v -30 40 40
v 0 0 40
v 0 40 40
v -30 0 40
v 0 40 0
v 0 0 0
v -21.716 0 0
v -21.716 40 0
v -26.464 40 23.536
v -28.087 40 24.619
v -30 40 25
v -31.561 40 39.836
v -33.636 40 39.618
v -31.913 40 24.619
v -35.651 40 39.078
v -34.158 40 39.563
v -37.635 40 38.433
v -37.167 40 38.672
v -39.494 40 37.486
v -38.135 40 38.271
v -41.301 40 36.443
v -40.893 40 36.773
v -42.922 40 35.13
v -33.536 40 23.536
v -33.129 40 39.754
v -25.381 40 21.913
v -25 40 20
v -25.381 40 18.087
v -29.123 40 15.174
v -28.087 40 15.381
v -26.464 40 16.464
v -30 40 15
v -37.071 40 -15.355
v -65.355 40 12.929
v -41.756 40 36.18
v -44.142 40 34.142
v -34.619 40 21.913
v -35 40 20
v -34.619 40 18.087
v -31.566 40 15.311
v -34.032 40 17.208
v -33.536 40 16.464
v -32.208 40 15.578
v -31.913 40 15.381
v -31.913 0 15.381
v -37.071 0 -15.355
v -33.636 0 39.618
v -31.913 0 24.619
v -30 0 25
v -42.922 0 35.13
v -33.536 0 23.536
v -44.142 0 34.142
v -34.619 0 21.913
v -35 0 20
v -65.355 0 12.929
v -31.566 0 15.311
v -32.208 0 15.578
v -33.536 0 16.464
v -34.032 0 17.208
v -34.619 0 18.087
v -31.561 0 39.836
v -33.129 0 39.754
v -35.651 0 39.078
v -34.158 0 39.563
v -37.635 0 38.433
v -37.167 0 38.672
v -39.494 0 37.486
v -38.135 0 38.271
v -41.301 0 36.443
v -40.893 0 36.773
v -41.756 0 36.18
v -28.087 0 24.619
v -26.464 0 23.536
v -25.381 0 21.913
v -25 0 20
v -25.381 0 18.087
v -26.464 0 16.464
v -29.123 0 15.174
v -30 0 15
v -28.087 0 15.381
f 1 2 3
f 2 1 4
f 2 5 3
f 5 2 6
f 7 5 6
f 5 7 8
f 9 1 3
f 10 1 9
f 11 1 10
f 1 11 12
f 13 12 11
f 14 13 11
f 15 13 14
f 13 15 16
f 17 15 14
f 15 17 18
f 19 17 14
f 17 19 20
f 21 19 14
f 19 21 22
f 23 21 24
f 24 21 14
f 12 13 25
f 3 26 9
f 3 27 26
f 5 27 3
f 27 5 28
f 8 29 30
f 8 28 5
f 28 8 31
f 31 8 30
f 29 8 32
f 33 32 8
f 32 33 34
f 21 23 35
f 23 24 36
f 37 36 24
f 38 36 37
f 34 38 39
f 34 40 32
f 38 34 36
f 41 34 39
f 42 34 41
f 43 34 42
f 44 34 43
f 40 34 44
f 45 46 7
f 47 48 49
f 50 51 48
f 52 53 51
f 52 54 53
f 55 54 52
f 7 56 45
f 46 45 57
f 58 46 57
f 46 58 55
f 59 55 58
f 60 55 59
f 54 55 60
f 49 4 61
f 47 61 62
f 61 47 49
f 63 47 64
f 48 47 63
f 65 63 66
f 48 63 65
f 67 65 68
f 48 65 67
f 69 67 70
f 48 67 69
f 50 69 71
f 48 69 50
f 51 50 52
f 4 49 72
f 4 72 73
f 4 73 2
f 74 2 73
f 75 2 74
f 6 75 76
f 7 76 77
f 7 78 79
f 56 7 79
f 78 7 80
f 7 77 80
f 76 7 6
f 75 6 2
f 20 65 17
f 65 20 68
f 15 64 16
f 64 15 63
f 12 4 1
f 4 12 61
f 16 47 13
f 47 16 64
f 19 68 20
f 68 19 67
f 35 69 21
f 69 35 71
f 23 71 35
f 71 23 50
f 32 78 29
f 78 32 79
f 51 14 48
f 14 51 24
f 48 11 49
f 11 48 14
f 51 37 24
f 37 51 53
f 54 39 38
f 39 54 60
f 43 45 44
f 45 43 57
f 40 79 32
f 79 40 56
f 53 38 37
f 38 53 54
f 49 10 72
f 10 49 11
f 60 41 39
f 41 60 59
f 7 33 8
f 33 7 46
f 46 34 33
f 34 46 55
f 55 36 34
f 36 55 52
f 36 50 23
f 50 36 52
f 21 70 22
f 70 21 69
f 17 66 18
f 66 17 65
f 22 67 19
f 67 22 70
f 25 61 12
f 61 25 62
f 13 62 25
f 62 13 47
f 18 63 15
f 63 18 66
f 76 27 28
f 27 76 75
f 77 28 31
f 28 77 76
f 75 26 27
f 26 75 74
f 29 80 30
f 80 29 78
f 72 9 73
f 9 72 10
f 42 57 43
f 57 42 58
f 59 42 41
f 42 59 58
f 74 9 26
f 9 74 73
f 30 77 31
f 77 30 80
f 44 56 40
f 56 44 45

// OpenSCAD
//活动铰链部件
module pivot_joint_part() {
    difference(){
union(){
cube([40,40,30]);
translate([20,20,30]){
 rotate([90,0,0]){
cylinder(h=40,d=40,center=true);
 }
 }}
 
 
translate([20,20,30]){
rotate([90,0,0]){
    difference(){
cylinder(h=60,d=10,center=true);    
    }
}
}}
    }
    
 //活动铰链
 module pivot_joint(){   
       
    rotate([0,-90,0]){
        pivot_joint_part(); 
        }
        
        translate([-30,0,20]){
    rotate([0,45,0]){
   translate([-20,0,-30]){ 
            pivot_joint_part() ;}}}
            
        }
        
        pivot_joint();
